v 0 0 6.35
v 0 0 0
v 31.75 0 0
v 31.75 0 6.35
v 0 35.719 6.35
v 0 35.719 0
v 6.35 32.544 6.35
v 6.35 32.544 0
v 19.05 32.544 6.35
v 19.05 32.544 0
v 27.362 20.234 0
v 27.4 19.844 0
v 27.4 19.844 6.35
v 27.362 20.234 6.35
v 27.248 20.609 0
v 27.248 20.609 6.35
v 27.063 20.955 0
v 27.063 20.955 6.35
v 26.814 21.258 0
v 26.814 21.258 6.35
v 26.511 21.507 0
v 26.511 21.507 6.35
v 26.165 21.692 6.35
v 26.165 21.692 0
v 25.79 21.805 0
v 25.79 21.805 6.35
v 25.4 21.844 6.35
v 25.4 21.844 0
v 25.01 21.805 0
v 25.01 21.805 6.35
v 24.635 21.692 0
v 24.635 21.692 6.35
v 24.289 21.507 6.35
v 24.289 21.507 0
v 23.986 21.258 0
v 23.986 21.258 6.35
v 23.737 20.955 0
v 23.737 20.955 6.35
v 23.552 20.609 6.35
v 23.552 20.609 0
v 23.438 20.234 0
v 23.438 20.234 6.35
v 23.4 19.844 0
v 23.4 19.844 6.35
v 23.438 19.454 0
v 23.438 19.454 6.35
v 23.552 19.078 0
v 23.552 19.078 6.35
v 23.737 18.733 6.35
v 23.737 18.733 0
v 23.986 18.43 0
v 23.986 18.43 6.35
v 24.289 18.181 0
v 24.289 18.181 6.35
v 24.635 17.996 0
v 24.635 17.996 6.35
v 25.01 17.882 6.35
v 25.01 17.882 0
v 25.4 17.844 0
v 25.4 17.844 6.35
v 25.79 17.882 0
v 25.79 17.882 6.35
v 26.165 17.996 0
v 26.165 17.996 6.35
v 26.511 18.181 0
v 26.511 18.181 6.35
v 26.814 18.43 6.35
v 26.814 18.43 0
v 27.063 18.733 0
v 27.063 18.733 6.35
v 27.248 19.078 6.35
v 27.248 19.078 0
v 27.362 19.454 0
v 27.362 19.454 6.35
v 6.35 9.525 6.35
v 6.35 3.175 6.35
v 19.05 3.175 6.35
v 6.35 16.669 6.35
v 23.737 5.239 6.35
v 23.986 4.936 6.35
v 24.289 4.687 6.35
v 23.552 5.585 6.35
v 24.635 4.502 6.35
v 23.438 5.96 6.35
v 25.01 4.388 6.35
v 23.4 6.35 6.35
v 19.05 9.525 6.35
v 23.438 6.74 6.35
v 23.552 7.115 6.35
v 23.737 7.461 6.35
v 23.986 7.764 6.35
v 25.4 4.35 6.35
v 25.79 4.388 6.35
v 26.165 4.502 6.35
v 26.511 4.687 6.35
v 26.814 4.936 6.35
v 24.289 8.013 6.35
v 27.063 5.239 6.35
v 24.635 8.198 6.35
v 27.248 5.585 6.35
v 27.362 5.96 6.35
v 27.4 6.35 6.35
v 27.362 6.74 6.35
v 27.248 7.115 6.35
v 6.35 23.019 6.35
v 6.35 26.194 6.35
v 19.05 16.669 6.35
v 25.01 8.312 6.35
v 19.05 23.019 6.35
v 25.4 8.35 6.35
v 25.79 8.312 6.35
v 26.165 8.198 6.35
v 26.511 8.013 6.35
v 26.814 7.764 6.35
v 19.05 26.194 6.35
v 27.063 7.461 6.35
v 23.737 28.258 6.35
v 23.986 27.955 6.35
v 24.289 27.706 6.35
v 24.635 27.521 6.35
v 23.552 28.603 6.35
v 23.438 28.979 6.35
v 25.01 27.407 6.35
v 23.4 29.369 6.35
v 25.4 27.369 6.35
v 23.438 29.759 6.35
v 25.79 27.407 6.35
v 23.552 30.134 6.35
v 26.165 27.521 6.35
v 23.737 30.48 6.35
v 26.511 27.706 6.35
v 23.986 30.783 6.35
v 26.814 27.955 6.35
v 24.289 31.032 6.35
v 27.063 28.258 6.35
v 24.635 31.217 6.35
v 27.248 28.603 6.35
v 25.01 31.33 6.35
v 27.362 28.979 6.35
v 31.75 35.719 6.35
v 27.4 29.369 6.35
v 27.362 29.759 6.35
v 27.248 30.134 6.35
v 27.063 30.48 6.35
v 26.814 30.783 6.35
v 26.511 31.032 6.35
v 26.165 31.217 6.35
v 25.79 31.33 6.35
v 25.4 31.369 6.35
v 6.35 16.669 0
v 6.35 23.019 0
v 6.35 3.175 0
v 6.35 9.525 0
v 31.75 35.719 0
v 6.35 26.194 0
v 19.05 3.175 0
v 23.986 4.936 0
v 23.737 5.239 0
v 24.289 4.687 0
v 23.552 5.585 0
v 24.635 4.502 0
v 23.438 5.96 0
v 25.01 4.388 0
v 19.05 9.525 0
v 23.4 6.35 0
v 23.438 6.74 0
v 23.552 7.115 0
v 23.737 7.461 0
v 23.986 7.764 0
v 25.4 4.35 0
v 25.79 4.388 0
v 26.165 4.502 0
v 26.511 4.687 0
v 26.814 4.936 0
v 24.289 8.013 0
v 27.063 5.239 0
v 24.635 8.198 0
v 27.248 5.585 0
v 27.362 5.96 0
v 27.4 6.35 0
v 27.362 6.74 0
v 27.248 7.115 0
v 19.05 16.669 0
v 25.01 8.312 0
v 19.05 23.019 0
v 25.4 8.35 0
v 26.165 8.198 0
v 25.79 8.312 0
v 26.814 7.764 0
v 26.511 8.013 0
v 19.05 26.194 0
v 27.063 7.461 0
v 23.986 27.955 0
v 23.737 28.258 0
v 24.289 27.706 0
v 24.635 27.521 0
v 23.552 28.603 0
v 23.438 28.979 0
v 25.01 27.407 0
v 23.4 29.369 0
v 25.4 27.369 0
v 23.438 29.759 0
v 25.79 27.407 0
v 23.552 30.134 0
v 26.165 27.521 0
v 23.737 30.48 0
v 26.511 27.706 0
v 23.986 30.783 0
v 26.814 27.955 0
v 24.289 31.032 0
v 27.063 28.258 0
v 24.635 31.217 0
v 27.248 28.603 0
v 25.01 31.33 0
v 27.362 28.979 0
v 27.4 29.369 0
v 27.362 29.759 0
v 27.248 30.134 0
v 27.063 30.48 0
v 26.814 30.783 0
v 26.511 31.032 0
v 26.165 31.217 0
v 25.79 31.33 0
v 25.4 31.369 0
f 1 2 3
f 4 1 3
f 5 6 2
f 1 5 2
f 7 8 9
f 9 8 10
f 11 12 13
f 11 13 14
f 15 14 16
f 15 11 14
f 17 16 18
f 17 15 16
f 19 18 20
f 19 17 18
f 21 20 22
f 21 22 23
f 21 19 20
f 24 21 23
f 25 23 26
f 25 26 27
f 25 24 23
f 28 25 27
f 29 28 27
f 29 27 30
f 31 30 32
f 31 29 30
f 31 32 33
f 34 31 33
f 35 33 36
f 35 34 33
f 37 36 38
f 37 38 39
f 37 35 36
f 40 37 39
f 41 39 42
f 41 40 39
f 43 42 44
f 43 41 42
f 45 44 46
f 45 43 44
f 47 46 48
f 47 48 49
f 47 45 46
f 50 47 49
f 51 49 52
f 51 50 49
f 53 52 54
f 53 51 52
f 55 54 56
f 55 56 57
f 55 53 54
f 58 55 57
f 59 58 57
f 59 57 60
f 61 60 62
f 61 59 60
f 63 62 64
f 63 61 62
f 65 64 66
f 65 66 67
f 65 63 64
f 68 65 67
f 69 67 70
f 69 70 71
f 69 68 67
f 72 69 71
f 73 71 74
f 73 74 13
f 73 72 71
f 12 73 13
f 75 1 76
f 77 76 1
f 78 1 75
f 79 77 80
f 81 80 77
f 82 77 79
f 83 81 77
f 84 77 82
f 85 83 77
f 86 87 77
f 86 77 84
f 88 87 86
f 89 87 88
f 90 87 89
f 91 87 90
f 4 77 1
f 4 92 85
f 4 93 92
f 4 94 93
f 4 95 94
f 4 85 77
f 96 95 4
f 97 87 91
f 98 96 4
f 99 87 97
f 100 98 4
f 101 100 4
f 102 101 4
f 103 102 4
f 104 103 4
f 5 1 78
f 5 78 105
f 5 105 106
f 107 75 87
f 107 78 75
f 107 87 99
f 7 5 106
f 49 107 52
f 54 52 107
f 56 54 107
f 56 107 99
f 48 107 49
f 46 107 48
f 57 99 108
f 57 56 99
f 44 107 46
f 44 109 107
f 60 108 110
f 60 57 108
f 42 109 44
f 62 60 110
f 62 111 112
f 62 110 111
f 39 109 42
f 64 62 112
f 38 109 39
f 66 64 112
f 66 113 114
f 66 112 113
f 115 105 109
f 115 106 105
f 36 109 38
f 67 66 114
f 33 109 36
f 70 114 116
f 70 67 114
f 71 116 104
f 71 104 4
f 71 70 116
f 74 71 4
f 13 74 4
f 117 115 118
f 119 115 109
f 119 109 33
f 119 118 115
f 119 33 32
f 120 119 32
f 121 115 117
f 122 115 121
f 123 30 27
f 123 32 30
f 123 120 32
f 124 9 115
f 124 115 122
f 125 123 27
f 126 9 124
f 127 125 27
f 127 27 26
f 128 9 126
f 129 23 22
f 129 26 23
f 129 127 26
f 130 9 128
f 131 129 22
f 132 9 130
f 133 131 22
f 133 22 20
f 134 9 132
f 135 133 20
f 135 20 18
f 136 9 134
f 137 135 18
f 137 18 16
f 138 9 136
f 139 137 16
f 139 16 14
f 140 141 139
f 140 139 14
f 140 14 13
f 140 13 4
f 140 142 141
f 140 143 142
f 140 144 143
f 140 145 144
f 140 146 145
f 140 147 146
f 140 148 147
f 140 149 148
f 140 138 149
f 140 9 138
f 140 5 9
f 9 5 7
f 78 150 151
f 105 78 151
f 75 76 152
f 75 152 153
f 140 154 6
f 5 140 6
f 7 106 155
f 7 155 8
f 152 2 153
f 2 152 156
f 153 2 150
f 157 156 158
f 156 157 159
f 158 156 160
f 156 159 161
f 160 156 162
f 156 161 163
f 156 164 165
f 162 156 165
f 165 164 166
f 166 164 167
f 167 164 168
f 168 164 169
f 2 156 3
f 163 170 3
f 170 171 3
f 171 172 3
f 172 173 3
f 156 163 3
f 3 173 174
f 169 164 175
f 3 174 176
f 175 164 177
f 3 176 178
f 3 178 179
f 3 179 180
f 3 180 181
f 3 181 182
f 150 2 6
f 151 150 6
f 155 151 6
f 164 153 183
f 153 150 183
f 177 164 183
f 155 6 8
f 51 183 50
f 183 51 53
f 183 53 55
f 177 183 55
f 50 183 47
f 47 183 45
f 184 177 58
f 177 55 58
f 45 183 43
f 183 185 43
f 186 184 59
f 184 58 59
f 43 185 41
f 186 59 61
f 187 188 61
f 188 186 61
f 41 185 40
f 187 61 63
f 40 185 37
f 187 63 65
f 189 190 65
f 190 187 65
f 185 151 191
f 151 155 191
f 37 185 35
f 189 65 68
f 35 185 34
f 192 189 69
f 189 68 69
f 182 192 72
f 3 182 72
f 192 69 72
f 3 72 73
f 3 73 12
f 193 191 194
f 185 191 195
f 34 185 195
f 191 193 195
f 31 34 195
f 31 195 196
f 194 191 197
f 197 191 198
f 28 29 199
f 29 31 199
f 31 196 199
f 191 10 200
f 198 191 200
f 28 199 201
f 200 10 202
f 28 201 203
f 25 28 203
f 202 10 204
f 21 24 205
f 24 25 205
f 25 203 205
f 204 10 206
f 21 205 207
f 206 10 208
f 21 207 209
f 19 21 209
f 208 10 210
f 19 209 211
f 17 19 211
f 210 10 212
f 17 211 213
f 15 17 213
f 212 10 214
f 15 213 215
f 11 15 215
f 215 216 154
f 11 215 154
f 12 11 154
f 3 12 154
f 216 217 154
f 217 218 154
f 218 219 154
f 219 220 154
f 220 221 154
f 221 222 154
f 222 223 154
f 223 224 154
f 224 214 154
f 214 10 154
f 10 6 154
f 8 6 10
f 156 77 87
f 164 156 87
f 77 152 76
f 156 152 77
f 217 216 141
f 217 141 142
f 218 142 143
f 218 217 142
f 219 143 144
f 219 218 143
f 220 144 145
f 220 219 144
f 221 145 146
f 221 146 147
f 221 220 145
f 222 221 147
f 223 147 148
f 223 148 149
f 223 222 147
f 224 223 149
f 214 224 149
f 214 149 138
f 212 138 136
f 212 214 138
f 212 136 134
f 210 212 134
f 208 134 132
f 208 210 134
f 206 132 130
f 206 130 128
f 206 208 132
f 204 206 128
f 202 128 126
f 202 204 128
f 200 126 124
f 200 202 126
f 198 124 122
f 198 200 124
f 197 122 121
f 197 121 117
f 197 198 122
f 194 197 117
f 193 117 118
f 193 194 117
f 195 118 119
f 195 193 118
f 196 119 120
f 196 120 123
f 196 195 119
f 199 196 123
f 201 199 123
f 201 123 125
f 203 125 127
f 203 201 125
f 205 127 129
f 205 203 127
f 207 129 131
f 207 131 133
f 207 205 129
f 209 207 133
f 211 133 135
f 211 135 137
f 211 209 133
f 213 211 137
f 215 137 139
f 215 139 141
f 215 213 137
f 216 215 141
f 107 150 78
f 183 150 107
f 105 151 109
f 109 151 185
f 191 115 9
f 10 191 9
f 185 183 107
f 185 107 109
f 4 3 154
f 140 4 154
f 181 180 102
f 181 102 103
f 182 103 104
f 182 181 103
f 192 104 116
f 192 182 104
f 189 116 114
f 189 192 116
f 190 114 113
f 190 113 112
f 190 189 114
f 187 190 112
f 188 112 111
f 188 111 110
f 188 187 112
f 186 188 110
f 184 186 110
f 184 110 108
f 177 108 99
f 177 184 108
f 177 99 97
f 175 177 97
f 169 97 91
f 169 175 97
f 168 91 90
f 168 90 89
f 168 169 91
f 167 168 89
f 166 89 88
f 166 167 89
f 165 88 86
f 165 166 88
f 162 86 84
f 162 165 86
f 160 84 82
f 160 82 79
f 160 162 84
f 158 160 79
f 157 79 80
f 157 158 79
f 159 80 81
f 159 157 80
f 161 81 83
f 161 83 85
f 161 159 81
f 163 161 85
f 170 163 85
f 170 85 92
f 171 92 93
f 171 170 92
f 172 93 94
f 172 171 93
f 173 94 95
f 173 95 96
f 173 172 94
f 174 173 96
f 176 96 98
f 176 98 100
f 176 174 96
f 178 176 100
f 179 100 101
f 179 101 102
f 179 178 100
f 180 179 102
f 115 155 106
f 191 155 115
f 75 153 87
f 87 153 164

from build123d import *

# Parameters (mm, degrees)
SKETCH1_R           = 2
SKETCH1_W           = 12.7
SKETCH1_H           = 6.35
BOSS_EXTRUDE1_DEPTH = 6.35


with BuildPart() as part:
    # Sketch1 → Boss-Extrude1 (new body)
    with BuildSketch(Plane.XY):
        Polygon((0, 35.71875), (0, 26.19375), (0, 0), (31.75, 0), (31.75, 26.19375), (31.75, 35.71875), align=None)
        with Locations((25.4, 19.84375)):
            Circle(SKETCH1_R, mode=Mode.SUBTRACT)
        with Locations((25.4, 6.35)):
            Circle(SKETCH1_R, mode=Mode.SUBTRACT)
        with Locations((25.4, 29.36875)):
            Circle(SKETCH1_R, mode=Mode.SUBTRACT)
        with Locations((12.7, 19.84375)):
            Rectangle(SKETCH1_W, SKETCH1_H, mode=Mode.SUBTRACT)
        with Locations((12.7, 6.35)):
            Rectangle(SKETCH1_W, SKETCH1_H, mode=Mode.SUBTRACT)
        with Locations((12.7, 29.36875)):
            Rectangle(SKETCH1_W, SKETCH1_H, mode=Mode.SUBTRACT)
    extrude(amount=BOSS_EXTRUDE1_DEPTH)


solid = part.part
